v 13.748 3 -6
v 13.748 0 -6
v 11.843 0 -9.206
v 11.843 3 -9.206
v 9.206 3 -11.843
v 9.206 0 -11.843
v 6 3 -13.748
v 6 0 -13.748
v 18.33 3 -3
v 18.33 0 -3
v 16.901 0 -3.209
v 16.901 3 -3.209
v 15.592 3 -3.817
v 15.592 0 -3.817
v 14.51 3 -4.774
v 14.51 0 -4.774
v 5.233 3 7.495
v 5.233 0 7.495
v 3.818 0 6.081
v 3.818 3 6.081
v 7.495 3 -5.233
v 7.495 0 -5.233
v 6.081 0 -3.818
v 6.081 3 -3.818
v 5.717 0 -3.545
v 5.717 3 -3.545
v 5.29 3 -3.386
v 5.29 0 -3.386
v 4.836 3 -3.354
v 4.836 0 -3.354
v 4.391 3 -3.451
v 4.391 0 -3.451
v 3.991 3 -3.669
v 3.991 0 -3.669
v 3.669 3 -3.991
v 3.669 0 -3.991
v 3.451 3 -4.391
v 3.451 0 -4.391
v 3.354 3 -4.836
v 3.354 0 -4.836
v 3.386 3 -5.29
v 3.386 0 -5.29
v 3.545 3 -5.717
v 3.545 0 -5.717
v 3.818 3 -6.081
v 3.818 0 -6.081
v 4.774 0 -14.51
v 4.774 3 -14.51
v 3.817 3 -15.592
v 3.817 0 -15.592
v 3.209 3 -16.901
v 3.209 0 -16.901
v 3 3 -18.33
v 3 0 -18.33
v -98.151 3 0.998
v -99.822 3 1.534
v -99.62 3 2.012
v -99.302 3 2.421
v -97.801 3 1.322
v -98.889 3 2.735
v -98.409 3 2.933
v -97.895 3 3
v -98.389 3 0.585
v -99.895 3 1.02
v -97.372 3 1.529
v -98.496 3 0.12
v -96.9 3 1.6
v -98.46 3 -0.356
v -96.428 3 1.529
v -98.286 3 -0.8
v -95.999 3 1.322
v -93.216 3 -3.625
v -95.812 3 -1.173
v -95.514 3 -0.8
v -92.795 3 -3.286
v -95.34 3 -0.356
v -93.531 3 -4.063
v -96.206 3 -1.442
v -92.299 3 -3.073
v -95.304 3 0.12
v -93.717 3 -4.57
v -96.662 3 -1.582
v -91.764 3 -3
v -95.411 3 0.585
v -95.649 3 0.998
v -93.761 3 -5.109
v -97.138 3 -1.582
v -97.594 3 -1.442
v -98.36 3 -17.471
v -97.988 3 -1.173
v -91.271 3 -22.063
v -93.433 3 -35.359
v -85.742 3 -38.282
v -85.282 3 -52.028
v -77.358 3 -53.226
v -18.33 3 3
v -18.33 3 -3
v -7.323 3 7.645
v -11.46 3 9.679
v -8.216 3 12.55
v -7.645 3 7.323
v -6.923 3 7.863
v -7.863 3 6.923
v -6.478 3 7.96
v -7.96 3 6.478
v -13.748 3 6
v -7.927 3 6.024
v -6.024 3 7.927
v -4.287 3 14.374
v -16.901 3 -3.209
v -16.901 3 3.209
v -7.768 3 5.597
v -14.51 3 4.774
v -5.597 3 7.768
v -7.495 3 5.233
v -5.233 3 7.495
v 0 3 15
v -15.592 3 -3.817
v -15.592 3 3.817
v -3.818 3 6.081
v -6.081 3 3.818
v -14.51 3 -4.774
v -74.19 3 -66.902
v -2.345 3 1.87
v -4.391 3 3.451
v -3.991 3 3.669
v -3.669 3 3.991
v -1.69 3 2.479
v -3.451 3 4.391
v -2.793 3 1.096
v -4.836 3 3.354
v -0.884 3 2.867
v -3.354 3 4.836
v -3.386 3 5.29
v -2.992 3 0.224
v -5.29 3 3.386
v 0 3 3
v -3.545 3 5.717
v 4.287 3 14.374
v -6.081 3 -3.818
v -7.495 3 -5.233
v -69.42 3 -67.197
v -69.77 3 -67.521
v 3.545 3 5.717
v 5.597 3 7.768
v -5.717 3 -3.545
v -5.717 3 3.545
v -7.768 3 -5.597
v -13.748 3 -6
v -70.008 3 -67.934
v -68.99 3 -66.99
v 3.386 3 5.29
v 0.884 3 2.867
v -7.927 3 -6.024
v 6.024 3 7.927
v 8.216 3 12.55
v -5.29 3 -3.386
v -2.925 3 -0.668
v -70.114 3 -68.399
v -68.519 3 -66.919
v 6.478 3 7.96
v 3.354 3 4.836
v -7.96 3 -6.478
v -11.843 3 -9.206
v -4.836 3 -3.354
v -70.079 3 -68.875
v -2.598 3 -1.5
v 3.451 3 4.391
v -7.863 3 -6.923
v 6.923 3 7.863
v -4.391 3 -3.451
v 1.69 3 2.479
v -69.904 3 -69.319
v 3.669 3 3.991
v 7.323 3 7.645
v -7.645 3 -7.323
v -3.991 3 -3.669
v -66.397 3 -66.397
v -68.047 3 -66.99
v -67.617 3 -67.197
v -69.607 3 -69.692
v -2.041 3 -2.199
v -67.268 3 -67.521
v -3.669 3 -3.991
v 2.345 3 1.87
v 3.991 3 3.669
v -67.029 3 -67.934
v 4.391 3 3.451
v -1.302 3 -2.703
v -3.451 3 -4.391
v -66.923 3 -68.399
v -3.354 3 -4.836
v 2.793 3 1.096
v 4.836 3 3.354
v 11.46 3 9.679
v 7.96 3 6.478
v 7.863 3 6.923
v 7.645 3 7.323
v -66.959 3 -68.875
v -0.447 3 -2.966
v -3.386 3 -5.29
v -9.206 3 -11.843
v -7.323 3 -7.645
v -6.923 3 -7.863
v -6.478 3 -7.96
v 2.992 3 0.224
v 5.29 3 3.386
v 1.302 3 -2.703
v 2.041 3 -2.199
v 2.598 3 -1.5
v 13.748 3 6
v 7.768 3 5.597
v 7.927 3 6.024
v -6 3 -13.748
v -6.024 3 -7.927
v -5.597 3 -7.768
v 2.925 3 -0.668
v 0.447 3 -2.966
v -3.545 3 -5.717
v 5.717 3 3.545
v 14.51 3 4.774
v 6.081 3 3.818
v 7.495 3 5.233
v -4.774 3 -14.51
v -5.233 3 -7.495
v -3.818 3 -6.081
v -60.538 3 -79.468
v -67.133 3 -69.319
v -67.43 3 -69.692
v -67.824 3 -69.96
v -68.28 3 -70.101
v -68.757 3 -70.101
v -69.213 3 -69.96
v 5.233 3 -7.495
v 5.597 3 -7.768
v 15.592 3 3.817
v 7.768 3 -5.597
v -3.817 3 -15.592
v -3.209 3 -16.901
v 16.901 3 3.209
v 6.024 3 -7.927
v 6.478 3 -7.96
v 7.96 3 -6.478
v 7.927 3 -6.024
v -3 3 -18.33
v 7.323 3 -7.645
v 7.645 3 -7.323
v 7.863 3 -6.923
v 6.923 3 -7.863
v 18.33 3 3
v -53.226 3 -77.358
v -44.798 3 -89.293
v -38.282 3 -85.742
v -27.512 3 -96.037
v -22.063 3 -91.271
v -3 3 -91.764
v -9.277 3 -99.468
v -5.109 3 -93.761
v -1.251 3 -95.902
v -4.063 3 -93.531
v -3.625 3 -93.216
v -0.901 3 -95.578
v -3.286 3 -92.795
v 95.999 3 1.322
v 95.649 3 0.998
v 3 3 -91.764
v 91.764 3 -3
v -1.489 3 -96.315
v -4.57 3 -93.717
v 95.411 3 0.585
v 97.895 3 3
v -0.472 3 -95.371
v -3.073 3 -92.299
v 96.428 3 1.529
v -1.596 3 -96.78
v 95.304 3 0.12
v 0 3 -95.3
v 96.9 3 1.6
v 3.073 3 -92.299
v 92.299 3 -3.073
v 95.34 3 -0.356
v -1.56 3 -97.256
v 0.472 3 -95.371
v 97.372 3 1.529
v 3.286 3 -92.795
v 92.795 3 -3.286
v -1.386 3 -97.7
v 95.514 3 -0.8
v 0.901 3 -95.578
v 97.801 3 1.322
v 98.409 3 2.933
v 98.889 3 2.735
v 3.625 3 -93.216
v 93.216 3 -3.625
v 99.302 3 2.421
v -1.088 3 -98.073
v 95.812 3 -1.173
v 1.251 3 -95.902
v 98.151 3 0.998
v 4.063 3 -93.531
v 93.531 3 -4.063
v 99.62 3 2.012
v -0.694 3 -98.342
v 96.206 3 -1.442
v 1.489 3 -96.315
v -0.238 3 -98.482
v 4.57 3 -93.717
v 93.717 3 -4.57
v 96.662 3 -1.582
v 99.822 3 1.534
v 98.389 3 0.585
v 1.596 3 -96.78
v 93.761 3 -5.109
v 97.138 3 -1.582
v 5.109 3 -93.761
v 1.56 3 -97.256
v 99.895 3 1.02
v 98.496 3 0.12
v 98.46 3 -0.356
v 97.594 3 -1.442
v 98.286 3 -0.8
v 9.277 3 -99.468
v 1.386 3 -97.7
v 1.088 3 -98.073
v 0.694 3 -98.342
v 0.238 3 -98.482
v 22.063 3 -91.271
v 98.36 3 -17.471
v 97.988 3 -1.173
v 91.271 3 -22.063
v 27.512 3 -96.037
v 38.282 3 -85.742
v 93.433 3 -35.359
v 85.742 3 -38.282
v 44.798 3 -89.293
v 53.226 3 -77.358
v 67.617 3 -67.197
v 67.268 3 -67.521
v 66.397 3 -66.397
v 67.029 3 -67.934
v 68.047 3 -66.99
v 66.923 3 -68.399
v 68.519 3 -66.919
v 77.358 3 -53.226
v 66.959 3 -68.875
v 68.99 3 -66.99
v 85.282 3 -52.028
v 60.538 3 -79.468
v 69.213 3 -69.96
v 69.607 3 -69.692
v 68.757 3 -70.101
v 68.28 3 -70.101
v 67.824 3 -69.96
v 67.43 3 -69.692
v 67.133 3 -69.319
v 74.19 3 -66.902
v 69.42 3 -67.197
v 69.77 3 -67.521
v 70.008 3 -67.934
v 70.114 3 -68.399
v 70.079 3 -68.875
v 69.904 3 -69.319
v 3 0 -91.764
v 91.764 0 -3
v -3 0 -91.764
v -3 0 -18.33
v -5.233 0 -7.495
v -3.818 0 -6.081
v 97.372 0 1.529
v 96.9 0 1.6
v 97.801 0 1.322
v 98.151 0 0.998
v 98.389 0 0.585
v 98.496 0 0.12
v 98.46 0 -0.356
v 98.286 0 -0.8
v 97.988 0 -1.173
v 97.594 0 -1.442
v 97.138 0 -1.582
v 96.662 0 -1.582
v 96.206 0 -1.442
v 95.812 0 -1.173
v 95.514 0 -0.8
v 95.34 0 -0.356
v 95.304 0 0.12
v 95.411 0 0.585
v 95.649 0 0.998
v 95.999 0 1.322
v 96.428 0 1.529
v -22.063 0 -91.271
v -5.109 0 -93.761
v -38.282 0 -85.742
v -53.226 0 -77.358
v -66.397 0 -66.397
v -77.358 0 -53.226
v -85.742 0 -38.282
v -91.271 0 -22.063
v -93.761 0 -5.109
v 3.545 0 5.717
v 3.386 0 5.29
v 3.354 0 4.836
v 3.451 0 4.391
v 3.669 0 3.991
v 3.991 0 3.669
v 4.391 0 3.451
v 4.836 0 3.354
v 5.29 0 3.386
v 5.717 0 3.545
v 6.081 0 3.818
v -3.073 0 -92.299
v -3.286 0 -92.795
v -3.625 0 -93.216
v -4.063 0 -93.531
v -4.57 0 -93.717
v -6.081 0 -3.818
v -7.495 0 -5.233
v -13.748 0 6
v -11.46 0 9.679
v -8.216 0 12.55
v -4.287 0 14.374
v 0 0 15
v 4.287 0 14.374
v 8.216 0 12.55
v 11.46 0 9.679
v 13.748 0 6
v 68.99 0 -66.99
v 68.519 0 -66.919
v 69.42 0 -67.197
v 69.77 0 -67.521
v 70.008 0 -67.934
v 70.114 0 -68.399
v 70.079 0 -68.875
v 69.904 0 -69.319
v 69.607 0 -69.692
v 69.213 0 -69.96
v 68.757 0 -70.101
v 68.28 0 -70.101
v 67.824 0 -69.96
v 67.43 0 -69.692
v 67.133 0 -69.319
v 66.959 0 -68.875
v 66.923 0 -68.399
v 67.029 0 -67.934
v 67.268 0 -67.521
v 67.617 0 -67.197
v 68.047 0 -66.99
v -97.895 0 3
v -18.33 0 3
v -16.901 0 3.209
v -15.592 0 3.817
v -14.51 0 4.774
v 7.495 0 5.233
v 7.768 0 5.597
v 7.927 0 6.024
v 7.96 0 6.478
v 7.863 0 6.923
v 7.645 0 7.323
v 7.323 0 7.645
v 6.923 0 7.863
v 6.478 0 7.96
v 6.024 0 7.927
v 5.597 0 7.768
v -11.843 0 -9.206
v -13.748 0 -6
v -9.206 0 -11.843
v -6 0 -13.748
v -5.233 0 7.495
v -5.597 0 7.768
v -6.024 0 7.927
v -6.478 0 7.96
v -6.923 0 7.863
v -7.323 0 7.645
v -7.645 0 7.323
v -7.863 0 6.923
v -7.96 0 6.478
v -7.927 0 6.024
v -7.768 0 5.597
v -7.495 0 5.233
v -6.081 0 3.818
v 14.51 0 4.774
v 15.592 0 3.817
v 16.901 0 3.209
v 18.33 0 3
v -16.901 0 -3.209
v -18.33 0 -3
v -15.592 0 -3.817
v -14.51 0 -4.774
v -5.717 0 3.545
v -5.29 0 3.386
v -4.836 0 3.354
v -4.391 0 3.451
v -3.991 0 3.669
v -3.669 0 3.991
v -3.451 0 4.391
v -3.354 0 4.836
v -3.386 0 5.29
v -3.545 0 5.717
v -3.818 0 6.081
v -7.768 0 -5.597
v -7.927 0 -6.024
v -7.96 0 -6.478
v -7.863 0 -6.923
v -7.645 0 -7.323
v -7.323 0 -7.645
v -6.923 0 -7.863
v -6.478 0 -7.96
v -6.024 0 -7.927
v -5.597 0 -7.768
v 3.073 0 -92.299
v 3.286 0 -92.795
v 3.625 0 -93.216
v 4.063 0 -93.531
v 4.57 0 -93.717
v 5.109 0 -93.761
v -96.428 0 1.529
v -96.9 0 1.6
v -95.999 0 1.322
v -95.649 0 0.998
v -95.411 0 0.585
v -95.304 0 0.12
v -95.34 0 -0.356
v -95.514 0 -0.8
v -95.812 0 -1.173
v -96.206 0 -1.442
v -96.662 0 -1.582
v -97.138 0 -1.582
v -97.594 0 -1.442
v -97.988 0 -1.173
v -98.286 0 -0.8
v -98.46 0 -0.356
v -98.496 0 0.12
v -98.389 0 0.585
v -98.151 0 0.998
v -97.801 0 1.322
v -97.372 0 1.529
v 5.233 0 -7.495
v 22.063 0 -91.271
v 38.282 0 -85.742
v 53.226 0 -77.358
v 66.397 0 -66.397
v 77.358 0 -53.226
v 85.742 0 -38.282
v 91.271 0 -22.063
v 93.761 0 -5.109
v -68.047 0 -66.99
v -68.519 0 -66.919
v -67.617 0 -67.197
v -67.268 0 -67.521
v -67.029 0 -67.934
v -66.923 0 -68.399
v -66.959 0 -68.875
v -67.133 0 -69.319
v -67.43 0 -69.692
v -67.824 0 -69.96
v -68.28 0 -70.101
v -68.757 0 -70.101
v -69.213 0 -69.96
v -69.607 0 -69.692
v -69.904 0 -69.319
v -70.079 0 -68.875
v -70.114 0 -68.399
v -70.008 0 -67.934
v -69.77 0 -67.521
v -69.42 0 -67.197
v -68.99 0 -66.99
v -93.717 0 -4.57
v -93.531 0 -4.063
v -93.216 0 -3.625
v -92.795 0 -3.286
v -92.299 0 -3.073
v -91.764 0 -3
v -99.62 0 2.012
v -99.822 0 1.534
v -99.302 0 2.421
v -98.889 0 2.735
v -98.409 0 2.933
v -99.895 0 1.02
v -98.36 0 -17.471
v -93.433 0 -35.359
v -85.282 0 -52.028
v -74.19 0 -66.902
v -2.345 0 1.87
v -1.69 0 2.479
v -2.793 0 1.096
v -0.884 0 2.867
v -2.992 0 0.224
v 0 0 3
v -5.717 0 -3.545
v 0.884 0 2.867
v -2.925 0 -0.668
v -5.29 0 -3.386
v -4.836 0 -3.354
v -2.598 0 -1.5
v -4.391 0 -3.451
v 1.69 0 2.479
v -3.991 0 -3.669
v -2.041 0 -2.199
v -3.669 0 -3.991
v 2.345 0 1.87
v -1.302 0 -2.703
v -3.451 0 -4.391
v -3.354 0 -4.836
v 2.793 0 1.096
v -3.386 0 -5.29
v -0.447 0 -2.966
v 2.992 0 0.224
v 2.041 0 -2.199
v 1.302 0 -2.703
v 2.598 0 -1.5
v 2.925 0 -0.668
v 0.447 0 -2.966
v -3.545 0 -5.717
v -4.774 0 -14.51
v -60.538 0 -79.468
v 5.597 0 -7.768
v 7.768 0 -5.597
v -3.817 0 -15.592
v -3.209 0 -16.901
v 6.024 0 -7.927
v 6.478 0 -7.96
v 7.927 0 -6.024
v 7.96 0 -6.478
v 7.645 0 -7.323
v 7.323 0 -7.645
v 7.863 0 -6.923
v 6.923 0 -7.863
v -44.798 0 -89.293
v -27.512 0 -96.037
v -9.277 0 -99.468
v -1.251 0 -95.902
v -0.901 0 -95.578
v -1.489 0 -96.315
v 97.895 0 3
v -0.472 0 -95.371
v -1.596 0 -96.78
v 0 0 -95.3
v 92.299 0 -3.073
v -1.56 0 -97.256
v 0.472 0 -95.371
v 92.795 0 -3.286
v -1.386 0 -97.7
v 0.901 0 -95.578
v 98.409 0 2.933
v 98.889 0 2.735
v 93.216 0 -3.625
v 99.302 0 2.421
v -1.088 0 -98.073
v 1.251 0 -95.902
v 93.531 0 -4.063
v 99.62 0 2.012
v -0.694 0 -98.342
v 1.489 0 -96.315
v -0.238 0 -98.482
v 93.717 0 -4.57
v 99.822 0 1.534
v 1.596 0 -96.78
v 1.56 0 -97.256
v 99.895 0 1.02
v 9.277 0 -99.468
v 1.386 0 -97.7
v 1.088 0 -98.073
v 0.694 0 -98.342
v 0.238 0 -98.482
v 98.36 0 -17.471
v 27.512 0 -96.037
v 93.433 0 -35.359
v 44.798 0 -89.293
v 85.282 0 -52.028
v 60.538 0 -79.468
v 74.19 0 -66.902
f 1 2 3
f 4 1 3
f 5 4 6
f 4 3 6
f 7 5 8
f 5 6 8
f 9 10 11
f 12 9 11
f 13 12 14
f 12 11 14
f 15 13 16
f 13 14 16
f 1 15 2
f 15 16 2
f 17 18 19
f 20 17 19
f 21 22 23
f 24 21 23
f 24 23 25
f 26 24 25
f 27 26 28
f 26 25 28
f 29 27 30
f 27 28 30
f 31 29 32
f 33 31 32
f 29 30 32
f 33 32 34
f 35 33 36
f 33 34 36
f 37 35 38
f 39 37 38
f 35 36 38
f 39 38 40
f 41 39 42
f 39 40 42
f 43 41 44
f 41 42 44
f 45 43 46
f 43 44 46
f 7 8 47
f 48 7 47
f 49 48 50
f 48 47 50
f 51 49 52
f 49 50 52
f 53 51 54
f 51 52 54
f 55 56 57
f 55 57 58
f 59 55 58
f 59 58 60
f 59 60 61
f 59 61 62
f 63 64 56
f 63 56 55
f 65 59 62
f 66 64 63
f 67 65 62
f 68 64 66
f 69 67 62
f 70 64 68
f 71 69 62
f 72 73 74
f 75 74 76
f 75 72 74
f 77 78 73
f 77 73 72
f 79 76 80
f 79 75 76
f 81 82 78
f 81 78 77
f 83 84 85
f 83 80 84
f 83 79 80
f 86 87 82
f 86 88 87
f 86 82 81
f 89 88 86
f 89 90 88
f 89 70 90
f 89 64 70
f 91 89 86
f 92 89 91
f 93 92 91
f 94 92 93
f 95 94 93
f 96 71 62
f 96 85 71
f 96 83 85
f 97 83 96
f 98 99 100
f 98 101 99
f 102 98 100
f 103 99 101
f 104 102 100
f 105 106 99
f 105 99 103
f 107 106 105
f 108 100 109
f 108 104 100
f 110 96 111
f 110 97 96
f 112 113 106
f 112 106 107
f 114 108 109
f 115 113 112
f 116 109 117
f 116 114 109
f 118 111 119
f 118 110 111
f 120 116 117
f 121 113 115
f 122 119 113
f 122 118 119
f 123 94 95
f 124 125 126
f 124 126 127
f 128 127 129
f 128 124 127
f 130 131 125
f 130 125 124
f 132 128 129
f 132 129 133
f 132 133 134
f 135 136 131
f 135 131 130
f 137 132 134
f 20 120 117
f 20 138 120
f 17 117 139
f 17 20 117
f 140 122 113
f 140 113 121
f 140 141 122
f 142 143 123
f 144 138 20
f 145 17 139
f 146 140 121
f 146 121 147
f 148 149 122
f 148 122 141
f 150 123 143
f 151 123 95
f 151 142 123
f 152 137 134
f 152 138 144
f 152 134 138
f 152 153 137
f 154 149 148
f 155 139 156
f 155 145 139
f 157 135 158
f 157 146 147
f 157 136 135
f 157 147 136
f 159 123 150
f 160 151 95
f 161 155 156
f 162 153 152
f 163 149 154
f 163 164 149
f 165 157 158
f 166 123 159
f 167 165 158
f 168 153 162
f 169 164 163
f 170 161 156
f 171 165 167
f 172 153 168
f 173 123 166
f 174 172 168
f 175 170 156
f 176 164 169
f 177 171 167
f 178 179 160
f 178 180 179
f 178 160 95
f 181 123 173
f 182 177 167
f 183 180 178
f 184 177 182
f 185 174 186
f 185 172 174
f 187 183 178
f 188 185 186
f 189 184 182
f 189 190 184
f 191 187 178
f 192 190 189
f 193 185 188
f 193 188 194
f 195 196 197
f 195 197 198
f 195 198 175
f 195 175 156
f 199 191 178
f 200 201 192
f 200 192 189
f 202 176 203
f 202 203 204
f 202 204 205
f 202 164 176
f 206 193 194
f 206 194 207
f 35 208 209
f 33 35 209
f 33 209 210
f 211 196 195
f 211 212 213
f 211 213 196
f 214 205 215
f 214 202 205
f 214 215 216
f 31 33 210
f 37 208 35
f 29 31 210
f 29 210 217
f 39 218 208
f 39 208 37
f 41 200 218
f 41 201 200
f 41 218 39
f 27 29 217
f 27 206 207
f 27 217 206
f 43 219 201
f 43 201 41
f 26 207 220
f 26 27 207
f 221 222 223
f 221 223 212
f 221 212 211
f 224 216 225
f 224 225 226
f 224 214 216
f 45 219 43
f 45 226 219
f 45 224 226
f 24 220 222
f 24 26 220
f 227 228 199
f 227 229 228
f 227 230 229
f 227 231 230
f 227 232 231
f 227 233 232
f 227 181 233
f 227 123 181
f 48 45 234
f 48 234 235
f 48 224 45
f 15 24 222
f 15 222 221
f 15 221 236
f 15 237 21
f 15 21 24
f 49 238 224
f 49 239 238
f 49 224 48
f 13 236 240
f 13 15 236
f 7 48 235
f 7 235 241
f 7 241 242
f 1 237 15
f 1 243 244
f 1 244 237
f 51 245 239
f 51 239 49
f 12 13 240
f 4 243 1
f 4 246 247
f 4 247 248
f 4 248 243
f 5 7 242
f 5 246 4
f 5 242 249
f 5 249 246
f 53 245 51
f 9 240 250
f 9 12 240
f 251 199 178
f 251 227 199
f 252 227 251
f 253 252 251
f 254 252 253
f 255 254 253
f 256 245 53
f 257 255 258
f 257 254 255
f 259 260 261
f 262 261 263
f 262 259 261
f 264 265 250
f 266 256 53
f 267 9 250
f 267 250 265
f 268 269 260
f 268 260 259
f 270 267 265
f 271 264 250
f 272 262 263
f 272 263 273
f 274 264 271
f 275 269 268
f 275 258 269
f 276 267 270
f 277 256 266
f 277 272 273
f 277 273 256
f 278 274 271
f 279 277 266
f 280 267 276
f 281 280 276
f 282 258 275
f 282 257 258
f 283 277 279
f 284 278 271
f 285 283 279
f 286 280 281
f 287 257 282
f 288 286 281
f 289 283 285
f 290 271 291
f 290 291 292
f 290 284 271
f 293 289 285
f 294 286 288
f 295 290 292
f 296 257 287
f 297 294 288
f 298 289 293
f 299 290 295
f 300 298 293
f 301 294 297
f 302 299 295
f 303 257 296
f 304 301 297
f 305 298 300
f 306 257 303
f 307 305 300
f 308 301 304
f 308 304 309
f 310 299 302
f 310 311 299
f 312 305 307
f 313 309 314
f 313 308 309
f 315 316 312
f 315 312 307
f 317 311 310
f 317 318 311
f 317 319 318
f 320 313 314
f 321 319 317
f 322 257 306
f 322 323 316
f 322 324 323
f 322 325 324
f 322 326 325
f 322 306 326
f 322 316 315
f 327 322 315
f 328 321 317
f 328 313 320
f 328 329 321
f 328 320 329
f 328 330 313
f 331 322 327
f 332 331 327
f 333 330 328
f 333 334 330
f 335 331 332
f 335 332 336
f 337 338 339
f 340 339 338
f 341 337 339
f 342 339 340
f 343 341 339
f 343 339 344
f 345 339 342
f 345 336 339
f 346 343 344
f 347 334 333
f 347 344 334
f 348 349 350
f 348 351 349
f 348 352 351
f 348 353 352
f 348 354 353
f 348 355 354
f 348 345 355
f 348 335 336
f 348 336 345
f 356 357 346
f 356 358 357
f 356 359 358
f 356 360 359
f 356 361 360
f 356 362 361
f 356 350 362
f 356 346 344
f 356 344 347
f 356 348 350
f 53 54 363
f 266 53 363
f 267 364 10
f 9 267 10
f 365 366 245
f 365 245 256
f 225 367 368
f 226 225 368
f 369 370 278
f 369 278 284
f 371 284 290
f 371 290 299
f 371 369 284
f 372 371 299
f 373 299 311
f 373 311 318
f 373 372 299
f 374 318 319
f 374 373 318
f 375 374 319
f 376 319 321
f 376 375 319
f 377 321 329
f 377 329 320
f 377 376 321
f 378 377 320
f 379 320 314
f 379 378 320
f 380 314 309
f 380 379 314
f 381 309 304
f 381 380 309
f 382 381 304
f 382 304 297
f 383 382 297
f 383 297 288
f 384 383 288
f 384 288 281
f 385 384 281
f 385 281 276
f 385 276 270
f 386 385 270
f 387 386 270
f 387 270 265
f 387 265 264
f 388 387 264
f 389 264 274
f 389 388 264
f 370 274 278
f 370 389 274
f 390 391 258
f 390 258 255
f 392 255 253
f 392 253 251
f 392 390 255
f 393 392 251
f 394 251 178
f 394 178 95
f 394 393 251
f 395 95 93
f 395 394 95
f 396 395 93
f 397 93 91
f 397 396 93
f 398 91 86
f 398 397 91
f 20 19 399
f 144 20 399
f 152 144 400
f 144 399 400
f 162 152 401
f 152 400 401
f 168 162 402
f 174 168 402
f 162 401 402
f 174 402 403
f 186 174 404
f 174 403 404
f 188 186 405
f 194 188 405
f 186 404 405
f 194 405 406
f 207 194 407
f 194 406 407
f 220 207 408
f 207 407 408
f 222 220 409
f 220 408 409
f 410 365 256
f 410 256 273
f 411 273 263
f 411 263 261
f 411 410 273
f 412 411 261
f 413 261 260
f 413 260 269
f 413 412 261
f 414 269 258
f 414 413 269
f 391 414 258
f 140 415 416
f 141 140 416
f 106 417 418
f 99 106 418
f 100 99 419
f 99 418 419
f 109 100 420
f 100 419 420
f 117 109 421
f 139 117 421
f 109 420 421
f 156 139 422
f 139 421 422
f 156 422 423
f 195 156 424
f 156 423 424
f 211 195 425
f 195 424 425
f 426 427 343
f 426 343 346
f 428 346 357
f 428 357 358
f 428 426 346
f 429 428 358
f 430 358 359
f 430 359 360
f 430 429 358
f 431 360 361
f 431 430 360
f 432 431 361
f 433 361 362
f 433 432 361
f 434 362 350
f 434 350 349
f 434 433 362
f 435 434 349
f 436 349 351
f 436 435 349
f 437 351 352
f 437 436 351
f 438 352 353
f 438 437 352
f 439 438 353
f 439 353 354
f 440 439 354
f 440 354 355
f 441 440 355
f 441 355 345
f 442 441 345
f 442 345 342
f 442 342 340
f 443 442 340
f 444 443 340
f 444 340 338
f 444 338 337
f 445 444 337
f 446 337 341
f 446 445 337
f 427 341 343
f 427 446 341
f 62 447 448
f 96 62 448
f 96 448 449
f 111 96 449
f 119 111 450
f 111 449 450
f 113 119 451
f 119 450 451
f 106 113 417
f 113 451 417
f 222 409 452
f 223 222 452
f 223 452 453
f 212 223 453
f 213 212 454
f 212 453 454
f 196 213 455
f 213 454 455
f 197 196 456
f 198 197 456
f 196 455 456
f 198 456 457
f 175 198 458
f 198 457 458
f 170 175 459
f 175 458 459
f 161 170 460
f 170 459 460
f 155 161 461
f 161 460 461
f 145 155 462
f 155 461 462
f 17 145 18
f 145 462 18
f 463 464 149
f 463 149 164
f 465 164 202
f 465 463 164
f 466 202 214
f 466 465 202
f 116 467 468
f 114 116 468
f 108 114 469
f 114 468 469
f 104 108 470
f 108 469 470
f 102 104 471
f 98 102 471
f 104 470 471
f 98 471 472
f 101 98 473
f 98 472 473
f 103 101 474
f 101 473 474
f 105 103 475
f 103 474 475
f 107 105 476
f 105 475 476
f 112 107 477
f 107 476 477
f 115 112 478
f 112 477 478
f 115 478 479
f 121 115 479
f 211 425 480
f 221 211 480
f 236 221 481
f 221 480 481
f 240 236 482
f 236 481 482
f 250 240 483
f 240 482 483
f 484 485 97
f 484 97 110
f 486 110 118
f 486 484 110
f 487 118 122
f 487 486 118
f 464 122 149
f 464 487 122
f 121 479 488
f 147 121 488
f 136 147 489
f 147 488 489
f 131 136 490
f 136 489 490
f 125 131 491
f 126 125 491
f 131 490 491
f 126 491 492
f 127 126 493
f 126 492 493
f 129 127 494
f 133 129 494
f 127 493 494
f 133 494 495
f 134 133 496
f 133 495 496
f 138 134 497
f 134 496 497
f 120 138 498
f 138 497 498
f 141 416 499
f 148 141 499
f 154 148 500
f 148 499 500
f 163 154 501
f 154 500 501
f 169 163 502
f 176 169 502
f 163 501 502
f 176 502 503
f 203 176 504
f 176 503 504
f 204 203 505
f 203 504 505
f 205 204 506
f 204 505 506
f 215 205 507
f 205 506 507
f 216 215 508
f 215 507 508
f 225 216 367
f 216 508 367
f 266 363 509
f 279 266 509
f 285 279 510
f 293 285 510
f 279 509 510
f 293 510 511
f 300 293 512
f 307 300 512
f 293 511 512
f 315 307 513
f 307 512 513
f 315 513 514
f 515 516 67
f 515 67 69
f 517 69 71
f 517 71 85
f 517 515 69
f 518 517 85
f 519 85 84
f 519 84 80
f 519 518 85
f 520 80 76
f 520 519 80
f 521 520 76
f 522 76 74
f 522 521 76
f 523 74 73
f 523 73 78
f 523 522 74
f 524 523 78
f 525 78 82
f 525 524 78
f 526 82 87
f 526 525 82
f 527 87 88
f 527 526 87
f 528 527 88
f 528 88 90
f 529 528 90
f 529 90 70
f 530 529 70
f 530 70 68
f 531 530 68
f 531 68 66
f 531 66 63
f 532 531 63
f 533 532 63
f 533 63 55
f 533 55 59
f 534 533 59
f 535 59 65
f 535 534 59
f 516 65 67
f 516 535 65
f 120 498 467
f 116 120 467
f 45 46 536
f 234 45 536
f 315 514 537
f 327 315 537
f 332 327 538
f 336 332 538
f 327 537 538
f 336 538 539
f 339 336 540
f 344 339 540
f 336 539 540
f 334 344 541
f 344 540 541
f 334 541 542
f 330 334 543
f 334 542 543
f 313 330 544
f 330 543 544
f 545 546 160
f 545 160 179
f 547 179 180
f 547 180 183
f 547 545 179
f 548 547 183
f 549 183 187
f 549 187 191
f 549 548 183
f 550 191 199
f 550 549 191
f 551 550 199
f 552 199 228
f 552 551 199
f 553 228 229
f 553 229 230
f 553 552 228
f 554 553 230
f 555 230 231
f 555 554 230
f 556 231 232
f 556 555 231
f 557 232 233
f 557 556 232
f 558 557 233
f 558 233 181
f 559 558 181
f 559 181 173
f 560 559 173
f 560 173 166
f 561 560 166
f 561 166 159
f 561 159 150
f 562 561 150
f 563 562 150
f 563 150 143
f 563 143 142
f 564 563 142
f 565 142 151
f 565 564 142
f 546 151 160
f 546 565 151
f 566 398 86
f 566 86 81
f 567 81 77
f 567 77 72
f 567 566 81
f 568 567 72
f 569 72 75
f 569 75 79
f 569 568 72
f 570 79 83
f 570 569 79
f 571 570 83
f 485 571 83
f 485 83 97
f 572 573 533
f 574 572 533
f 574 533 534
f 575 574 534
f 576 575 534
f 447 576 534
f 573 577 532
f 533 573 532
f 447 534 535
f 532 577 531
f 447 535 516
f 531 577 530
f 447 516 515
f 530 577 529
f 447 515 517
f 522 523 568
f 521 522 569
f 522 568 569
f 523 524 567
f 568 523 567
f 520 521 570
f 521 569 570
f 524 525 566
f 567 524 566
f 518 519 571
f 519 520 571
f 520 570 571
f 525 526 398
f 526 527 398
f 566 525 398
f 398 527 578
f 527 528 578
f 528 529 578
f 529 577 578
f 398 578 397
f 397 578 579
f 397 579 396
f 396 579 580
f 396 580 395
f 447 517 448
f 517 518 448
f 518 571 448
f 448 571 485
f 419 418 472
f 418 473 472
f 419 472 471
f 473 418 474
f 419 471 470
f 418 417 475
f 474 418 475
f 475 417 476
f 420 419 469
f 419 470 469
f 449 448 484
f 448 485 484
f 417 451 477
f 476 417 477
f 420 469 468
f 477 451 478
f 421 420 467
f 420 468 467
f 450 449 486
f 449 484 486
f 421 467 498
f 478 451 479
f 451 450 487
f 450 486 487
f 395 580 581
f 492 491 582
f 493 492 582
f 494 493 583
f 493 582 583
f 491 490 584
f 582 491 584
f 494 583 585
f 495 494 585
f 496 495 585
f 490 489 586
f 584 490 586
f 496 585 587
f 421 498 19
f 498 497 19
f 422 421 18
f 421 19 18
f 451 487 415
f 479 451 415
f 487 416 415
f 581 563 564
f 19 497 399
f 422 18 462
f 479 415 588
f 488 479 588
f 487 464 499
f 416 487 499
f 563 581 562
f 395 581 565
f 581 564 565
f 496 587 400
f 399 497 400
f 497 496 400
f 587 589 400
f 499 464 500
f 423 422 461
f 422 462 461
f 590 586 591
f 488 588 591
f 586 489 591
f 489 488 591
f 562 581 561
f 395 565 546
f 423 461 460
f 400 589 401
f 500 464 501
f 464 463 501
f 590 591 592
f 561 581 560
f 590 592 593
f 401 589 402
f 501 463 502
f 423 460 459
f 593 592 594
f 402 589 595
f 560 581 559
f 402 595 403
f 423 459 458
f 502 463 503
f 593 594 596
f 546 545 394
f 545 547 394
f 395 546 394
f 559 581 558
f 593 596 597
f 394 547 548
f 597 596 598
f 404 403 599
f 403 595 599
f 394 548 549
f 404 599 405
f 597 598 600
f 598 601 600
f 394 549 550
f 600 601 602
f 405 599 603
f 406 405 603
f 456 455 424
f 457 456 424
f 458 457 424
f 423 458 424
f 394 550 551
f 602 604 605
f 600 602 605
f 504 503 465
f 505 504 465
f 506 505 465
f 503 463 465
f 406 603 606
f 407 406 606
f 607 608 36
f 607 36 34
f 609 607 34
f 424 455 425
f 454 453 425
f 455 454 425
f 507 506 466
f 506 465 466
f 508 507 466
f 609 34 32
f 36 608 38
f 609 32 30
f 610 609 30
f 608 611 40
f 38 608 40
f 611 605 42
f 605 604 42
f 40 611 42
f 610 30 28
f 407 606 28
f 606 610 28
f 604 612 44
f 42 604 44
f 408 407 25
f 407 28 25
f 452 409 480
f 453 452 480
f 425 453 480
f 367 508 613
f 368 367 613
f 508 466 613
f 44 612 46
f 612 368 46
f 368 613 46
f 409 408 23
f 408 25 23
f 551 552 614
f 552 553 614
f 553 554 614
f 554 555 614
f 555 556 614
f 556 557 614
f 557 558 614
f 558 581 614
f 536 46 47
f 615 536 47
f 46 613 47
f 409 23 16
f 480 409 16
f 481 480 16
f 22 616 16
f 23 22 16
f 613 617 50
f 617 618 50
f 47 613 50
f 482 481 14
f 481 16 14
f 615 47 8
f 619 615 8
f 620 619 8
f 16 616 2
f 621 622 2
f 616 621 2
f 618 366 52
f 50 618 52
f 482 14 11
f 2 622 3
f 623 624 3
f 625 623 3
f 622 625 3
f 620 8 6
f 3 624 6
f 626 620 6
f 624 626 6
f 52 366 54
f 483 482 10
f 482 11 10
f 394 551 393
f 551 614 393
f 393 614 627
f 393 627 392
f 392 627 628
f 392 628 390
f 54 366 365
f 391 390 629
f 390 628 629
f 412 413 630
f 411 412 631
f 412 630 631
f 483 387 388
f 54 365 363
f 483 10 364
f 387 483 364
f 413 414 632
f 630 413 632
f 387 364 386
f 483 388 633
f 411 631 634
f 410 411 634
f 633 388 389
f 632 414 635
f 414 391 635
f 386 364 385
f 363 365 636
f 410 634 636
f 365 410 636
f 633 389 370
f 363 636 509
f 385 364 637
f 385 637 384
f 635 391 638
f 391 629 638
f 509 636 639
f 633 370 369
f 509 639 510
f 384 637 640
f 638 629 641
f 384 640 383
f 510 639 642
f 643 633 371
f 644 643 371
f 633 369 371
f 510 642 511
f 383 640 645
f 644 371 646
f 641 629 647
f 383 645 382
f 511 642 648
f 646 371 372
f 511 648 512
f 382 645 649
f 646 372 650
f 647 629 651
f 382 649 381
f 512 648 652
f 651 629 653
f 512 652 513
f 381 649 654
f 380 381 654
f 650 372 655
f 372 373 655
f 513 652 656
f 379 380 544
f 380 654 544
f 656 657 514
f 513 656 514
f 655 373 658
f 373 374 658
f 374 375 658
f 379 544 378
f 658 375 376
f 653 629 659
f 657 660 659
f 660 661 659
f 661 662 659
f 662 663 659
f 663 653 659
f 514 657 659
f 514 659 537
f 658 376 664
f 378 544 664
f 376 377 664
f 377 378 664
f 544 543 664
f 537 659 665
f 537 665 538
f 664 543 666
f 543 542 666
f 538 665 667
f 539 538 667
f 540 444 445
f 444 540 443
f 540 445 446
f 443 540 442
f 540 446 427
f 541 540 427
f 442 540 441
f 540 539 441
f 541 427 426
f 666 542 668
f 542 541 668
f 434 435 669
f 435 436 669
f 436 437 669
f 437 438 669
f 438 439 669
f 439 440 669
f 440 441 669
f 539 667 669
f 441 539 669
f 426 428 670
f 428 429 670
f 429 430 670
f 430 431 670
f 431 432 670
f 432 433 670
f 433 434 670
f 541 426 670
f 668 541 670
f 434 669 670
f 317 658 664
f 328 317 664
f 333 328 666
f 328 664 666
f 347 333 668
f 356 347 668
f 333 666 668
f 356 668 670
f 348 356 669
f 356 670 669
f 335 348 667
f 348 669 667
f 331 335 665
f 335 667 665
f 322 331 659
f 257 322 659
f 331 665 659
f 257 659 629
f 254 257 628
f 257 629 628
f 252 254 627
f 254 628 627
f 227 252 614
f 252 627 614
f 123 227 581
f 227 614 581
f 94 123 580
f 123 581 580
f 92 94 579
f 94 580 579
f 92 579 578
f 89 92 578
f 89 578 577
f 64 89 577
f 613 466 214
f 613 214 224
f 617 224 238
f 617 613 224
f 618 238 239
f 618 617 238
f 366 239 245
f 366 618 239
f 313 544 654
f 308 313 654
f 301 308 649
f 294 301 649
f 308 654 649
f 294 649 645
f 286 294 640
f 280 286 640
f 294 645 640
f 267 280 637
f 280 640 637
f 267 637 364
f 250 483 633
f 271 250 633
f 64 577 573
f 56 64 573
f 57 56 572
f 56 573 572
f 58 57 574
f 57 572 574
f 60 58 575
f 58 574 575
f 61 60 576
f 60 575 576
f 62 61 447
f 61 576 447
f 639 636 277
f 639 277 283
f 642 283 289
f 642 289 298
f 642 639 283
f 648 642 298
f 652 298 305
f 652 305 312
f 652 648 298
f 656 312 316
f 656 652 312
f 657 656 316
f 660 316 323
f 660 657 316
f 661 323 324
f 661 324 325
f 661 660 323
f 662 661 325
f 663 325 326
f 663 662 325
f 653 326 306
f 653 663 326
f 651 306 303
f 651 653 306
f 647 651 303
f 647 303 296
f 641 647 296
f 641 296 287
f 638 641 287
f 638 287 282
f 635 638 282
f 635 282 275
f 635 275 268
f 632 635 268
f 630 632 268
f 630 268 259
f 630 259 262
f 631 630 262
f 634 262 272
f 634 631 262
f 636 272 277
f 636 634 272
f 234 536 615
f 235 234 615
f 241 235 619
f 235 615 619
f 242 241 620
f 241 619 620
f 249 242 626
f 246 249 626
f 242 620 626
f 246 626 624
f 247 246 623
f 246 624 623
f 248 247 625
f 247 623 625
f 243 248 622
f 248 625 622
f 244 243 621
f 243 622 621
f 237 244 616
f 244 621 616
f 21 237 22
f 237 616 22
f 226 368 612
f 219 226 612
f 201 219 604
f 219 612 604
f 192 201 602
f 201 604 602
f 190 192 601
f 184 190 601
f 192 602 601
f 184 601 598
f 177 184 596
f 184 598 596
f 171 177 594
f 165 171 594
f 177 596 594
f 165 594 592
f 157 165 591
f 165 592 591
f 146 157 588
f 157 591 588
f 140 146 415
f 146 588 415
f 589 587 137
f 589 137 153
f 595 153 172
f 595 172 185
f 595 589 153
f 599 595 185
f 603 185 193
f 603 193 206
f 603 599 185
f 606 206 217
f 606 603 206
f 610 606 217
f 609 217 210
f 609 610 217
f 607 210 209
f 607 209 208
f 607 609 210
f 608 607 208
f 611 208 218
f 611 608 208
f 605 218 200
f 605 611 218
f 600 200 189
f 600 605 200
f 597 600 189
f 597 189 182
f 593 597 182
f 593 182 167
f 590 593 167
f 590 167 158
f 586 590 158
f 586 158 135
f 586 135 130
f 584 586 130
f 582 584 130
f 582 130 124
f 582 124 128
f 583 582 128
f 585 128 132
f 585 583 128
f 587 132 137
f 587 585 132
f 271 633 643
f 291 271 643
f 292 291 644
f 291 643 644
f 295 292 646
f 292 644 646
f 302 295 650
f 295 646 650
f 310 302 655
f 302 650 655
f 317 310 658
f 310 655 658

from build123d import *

# Parameters (mm, degrees)
SKETCH_1_R      = 1.6
SKETCH_1_R_2    = 3
EXTRUDE_1_DEPTH = 3


with BuildPart() as part:
    # 草图1 → 凸台-拉伸1 (new body)
    with BuildSketch(Plane(origin=(0, 0, 0), x_dir=(1, 0, 0), z_dir=(0, 1, 0))):
        with BuildLine():
            Line((-97.894892614, -3), (-18.33030278, -3))
            ThreePointArc((-18.33030278, -3), (-15.591689992, -3.816699867), (-13.747727085, -6))
            ThreePointArc((-13.747727085, -6), (0, -15), (13.747727085, -6))
            ThreePointArc((13.747727085, -6), (15.591689992, -3.816699867), (18.33030278, -3))
            Line((18.33030278, -3), (97.894892614, -3))
            ThreePointArc((97.894892614, -3), (99.301864892, -2.421417957), (99.894788276, -1.020429009))
            ThreePointArc((99.894788276, -1.020429009), (0, 99.9), (-99.894788276, -1.020429009))
            ThreePointArc((-99.894788276, -1.020429009), (-99.301864892, -2.421417957), (-97.894892614, -3))
        make_face()
        with Locations(Location((0, 96.9, 0), (0, 0, 270))):
            Circle(SKETCH_1_R, mode=Mode.SUBTRACT)
        with Locations(Location((68.518647097, 68.518647097, 0), (0, 0, 270))):
            Circle(SKETCH_1_R, mode=Mode.SUBTRACT)
        with Locations(Location((96.9, 0, 0), (0, 0, 270))):
            Circle(SKETCH_1_R, mode=Mode.SUBTRACT)
        with Locations(Location((-96.9, 0, 0), (0, 0, 270))):
            Circle(SKETCH_1_R, mode=Mode.SUBTRACT)
        with Locations(Location((-68.518647097, 68.518647097, 0), (0, 0, 270))):
            Circle(SKETCH_1_R, mode=Mode.SUBTRACT)
        with Locations(Location((0, 0, 0), (0, 0, 270))):
            Circle(SKETCH_1_R_2, mode=Mode.SUBTRACT)
        with BuildLine():
            Line((6.081118318, -3.818376618), (7.495331881, -5.232590181))
            ThreePointArc((7.495331881, -5.232590181), (7.495331881, -7.495331881), (5.232590181, -7.495331881))
            Line((5.232590181, -7.495331881), (3.818376618, -6.081118318))
            ThreePointArc((3.818376618, -6.081118318), (3.818376618, -3.818376618), (6.081118318, -3.818376618))
        make_face(mode=Mode.SUBTRACT)
        with BuildLine():
            Line((-3.818376618, -6.081118318), (-5.232590181, -7.495331881))
            ThreePointArc((-5.232590181, -7.495331881), (-7.495331881, -7.495331881), (-7.495331881, -5.232590181))
            Line((-7.495331881, -5.232590181), (-6.081118318, -3.818376618))
            ThreePointArc((-6.081118318, -3.818376618), (-3.818376618, -3.818376618), (-3.818376618, -6.081118318))
        make_face(mode=Mode.SUBTRACT)
        with BuildLine():
            Line((-6.081118318, 3.818376618), (-7.495331881, 5.232590181))
            ThreePointArc((-7.495331881, 5.232590181), (-7.495331881, 7.495331881), (-5.232590181, 7.495331881))
            Line((-5.232590181, 7.495331881), (-3.818376618, 6.081118318))
            ThreePointArc((-3.818376618, 6.081118318), (-3.818376618, 3.818376618), (-6.081118318, 3.818376618))
        make_face(mode=Mode.SUBTRACT)
        with BuildLine():
            Line((3.818376618, 6.081118318), (5.232590181, 7.495331881))
            ThreePointArc((5.232590181, 7.495331881), (7.495331881, 7.495331881), (7.495331881, 5.232590181))
            Line((7.495331881, 5.232590181), (6.081118318, 3.818376618))
            ThreePointArc((6.081118318, 3.818376618), (3.818376618, 3.818376618), (3.818376618, 6.081118318))
        make_face(mode=Mode.SUBTRACT)
        with BuildLine():
            Line((-91.763881784, 3), (-18.33030278, 3))
            ThreePointArc((-18.33030278, 3), (-15.591689992, 3.816699867), (-13.747727085, 6))
            ThreePointArc((-13.747727085, 6), (-10.606601718, 10.606601718), (-6, 13.747727085))
            ThreePointArc((-6, 13.747727085), (-3.816699867, 15.591689992), (-3, 18.33030278))
            Line((-3, 18.33030278), (-3, 91.763881784))
            ThreePointArc((-3, 91.763881784), (-3.624795989, 93.216057368), (-5.108813928, 93.760919472))
            ThreePointArc((-5.108813928, 93.760919472), (-66.397326753, 66.397326753), (-93.760919472, 5.108813928))
            ThreePointArc((-93.760919472, 5.108813928), (-93.216057368, 3.624795989), (-91.763881784, 3))
        make_face(mode=Mode.SUBTRACT)
        with BuildLine():
            Line((3, 18.33030278), (3, 91.763881784))
            ThreePointArc((3, 91.763881784), (3.624795989, 93.216057368), (5.108813928, 93.760919472))
            ThreePointArc((5.108813928, 93.760919472), (66.397326753, 66.397326753), (93.760919472, 5.108813928))
            ThreePointArc((93.760919472, 5.108813928), (93.216057368, 3.624795989), (91.763881784, 3))
            Line((91.763881784, 3), (18.33030278, 3))
            ThreePointArc((18.33030278, 3), (15.591689992, 3.816699867), (13.747727085, 6))
            ThreePointArc((13.747727085, 6), (10.606601718, 10.606601718), (6, 13.747727085))
            ThreePointArc((6, 13.747727085), (3.816699867, 15.591689992), (3, 18.33030278))
        make_face(mode=Mode.SUBTRACT)
    extrude(amount=EXTRUDE_1_DEPTH)


solid = part.part
